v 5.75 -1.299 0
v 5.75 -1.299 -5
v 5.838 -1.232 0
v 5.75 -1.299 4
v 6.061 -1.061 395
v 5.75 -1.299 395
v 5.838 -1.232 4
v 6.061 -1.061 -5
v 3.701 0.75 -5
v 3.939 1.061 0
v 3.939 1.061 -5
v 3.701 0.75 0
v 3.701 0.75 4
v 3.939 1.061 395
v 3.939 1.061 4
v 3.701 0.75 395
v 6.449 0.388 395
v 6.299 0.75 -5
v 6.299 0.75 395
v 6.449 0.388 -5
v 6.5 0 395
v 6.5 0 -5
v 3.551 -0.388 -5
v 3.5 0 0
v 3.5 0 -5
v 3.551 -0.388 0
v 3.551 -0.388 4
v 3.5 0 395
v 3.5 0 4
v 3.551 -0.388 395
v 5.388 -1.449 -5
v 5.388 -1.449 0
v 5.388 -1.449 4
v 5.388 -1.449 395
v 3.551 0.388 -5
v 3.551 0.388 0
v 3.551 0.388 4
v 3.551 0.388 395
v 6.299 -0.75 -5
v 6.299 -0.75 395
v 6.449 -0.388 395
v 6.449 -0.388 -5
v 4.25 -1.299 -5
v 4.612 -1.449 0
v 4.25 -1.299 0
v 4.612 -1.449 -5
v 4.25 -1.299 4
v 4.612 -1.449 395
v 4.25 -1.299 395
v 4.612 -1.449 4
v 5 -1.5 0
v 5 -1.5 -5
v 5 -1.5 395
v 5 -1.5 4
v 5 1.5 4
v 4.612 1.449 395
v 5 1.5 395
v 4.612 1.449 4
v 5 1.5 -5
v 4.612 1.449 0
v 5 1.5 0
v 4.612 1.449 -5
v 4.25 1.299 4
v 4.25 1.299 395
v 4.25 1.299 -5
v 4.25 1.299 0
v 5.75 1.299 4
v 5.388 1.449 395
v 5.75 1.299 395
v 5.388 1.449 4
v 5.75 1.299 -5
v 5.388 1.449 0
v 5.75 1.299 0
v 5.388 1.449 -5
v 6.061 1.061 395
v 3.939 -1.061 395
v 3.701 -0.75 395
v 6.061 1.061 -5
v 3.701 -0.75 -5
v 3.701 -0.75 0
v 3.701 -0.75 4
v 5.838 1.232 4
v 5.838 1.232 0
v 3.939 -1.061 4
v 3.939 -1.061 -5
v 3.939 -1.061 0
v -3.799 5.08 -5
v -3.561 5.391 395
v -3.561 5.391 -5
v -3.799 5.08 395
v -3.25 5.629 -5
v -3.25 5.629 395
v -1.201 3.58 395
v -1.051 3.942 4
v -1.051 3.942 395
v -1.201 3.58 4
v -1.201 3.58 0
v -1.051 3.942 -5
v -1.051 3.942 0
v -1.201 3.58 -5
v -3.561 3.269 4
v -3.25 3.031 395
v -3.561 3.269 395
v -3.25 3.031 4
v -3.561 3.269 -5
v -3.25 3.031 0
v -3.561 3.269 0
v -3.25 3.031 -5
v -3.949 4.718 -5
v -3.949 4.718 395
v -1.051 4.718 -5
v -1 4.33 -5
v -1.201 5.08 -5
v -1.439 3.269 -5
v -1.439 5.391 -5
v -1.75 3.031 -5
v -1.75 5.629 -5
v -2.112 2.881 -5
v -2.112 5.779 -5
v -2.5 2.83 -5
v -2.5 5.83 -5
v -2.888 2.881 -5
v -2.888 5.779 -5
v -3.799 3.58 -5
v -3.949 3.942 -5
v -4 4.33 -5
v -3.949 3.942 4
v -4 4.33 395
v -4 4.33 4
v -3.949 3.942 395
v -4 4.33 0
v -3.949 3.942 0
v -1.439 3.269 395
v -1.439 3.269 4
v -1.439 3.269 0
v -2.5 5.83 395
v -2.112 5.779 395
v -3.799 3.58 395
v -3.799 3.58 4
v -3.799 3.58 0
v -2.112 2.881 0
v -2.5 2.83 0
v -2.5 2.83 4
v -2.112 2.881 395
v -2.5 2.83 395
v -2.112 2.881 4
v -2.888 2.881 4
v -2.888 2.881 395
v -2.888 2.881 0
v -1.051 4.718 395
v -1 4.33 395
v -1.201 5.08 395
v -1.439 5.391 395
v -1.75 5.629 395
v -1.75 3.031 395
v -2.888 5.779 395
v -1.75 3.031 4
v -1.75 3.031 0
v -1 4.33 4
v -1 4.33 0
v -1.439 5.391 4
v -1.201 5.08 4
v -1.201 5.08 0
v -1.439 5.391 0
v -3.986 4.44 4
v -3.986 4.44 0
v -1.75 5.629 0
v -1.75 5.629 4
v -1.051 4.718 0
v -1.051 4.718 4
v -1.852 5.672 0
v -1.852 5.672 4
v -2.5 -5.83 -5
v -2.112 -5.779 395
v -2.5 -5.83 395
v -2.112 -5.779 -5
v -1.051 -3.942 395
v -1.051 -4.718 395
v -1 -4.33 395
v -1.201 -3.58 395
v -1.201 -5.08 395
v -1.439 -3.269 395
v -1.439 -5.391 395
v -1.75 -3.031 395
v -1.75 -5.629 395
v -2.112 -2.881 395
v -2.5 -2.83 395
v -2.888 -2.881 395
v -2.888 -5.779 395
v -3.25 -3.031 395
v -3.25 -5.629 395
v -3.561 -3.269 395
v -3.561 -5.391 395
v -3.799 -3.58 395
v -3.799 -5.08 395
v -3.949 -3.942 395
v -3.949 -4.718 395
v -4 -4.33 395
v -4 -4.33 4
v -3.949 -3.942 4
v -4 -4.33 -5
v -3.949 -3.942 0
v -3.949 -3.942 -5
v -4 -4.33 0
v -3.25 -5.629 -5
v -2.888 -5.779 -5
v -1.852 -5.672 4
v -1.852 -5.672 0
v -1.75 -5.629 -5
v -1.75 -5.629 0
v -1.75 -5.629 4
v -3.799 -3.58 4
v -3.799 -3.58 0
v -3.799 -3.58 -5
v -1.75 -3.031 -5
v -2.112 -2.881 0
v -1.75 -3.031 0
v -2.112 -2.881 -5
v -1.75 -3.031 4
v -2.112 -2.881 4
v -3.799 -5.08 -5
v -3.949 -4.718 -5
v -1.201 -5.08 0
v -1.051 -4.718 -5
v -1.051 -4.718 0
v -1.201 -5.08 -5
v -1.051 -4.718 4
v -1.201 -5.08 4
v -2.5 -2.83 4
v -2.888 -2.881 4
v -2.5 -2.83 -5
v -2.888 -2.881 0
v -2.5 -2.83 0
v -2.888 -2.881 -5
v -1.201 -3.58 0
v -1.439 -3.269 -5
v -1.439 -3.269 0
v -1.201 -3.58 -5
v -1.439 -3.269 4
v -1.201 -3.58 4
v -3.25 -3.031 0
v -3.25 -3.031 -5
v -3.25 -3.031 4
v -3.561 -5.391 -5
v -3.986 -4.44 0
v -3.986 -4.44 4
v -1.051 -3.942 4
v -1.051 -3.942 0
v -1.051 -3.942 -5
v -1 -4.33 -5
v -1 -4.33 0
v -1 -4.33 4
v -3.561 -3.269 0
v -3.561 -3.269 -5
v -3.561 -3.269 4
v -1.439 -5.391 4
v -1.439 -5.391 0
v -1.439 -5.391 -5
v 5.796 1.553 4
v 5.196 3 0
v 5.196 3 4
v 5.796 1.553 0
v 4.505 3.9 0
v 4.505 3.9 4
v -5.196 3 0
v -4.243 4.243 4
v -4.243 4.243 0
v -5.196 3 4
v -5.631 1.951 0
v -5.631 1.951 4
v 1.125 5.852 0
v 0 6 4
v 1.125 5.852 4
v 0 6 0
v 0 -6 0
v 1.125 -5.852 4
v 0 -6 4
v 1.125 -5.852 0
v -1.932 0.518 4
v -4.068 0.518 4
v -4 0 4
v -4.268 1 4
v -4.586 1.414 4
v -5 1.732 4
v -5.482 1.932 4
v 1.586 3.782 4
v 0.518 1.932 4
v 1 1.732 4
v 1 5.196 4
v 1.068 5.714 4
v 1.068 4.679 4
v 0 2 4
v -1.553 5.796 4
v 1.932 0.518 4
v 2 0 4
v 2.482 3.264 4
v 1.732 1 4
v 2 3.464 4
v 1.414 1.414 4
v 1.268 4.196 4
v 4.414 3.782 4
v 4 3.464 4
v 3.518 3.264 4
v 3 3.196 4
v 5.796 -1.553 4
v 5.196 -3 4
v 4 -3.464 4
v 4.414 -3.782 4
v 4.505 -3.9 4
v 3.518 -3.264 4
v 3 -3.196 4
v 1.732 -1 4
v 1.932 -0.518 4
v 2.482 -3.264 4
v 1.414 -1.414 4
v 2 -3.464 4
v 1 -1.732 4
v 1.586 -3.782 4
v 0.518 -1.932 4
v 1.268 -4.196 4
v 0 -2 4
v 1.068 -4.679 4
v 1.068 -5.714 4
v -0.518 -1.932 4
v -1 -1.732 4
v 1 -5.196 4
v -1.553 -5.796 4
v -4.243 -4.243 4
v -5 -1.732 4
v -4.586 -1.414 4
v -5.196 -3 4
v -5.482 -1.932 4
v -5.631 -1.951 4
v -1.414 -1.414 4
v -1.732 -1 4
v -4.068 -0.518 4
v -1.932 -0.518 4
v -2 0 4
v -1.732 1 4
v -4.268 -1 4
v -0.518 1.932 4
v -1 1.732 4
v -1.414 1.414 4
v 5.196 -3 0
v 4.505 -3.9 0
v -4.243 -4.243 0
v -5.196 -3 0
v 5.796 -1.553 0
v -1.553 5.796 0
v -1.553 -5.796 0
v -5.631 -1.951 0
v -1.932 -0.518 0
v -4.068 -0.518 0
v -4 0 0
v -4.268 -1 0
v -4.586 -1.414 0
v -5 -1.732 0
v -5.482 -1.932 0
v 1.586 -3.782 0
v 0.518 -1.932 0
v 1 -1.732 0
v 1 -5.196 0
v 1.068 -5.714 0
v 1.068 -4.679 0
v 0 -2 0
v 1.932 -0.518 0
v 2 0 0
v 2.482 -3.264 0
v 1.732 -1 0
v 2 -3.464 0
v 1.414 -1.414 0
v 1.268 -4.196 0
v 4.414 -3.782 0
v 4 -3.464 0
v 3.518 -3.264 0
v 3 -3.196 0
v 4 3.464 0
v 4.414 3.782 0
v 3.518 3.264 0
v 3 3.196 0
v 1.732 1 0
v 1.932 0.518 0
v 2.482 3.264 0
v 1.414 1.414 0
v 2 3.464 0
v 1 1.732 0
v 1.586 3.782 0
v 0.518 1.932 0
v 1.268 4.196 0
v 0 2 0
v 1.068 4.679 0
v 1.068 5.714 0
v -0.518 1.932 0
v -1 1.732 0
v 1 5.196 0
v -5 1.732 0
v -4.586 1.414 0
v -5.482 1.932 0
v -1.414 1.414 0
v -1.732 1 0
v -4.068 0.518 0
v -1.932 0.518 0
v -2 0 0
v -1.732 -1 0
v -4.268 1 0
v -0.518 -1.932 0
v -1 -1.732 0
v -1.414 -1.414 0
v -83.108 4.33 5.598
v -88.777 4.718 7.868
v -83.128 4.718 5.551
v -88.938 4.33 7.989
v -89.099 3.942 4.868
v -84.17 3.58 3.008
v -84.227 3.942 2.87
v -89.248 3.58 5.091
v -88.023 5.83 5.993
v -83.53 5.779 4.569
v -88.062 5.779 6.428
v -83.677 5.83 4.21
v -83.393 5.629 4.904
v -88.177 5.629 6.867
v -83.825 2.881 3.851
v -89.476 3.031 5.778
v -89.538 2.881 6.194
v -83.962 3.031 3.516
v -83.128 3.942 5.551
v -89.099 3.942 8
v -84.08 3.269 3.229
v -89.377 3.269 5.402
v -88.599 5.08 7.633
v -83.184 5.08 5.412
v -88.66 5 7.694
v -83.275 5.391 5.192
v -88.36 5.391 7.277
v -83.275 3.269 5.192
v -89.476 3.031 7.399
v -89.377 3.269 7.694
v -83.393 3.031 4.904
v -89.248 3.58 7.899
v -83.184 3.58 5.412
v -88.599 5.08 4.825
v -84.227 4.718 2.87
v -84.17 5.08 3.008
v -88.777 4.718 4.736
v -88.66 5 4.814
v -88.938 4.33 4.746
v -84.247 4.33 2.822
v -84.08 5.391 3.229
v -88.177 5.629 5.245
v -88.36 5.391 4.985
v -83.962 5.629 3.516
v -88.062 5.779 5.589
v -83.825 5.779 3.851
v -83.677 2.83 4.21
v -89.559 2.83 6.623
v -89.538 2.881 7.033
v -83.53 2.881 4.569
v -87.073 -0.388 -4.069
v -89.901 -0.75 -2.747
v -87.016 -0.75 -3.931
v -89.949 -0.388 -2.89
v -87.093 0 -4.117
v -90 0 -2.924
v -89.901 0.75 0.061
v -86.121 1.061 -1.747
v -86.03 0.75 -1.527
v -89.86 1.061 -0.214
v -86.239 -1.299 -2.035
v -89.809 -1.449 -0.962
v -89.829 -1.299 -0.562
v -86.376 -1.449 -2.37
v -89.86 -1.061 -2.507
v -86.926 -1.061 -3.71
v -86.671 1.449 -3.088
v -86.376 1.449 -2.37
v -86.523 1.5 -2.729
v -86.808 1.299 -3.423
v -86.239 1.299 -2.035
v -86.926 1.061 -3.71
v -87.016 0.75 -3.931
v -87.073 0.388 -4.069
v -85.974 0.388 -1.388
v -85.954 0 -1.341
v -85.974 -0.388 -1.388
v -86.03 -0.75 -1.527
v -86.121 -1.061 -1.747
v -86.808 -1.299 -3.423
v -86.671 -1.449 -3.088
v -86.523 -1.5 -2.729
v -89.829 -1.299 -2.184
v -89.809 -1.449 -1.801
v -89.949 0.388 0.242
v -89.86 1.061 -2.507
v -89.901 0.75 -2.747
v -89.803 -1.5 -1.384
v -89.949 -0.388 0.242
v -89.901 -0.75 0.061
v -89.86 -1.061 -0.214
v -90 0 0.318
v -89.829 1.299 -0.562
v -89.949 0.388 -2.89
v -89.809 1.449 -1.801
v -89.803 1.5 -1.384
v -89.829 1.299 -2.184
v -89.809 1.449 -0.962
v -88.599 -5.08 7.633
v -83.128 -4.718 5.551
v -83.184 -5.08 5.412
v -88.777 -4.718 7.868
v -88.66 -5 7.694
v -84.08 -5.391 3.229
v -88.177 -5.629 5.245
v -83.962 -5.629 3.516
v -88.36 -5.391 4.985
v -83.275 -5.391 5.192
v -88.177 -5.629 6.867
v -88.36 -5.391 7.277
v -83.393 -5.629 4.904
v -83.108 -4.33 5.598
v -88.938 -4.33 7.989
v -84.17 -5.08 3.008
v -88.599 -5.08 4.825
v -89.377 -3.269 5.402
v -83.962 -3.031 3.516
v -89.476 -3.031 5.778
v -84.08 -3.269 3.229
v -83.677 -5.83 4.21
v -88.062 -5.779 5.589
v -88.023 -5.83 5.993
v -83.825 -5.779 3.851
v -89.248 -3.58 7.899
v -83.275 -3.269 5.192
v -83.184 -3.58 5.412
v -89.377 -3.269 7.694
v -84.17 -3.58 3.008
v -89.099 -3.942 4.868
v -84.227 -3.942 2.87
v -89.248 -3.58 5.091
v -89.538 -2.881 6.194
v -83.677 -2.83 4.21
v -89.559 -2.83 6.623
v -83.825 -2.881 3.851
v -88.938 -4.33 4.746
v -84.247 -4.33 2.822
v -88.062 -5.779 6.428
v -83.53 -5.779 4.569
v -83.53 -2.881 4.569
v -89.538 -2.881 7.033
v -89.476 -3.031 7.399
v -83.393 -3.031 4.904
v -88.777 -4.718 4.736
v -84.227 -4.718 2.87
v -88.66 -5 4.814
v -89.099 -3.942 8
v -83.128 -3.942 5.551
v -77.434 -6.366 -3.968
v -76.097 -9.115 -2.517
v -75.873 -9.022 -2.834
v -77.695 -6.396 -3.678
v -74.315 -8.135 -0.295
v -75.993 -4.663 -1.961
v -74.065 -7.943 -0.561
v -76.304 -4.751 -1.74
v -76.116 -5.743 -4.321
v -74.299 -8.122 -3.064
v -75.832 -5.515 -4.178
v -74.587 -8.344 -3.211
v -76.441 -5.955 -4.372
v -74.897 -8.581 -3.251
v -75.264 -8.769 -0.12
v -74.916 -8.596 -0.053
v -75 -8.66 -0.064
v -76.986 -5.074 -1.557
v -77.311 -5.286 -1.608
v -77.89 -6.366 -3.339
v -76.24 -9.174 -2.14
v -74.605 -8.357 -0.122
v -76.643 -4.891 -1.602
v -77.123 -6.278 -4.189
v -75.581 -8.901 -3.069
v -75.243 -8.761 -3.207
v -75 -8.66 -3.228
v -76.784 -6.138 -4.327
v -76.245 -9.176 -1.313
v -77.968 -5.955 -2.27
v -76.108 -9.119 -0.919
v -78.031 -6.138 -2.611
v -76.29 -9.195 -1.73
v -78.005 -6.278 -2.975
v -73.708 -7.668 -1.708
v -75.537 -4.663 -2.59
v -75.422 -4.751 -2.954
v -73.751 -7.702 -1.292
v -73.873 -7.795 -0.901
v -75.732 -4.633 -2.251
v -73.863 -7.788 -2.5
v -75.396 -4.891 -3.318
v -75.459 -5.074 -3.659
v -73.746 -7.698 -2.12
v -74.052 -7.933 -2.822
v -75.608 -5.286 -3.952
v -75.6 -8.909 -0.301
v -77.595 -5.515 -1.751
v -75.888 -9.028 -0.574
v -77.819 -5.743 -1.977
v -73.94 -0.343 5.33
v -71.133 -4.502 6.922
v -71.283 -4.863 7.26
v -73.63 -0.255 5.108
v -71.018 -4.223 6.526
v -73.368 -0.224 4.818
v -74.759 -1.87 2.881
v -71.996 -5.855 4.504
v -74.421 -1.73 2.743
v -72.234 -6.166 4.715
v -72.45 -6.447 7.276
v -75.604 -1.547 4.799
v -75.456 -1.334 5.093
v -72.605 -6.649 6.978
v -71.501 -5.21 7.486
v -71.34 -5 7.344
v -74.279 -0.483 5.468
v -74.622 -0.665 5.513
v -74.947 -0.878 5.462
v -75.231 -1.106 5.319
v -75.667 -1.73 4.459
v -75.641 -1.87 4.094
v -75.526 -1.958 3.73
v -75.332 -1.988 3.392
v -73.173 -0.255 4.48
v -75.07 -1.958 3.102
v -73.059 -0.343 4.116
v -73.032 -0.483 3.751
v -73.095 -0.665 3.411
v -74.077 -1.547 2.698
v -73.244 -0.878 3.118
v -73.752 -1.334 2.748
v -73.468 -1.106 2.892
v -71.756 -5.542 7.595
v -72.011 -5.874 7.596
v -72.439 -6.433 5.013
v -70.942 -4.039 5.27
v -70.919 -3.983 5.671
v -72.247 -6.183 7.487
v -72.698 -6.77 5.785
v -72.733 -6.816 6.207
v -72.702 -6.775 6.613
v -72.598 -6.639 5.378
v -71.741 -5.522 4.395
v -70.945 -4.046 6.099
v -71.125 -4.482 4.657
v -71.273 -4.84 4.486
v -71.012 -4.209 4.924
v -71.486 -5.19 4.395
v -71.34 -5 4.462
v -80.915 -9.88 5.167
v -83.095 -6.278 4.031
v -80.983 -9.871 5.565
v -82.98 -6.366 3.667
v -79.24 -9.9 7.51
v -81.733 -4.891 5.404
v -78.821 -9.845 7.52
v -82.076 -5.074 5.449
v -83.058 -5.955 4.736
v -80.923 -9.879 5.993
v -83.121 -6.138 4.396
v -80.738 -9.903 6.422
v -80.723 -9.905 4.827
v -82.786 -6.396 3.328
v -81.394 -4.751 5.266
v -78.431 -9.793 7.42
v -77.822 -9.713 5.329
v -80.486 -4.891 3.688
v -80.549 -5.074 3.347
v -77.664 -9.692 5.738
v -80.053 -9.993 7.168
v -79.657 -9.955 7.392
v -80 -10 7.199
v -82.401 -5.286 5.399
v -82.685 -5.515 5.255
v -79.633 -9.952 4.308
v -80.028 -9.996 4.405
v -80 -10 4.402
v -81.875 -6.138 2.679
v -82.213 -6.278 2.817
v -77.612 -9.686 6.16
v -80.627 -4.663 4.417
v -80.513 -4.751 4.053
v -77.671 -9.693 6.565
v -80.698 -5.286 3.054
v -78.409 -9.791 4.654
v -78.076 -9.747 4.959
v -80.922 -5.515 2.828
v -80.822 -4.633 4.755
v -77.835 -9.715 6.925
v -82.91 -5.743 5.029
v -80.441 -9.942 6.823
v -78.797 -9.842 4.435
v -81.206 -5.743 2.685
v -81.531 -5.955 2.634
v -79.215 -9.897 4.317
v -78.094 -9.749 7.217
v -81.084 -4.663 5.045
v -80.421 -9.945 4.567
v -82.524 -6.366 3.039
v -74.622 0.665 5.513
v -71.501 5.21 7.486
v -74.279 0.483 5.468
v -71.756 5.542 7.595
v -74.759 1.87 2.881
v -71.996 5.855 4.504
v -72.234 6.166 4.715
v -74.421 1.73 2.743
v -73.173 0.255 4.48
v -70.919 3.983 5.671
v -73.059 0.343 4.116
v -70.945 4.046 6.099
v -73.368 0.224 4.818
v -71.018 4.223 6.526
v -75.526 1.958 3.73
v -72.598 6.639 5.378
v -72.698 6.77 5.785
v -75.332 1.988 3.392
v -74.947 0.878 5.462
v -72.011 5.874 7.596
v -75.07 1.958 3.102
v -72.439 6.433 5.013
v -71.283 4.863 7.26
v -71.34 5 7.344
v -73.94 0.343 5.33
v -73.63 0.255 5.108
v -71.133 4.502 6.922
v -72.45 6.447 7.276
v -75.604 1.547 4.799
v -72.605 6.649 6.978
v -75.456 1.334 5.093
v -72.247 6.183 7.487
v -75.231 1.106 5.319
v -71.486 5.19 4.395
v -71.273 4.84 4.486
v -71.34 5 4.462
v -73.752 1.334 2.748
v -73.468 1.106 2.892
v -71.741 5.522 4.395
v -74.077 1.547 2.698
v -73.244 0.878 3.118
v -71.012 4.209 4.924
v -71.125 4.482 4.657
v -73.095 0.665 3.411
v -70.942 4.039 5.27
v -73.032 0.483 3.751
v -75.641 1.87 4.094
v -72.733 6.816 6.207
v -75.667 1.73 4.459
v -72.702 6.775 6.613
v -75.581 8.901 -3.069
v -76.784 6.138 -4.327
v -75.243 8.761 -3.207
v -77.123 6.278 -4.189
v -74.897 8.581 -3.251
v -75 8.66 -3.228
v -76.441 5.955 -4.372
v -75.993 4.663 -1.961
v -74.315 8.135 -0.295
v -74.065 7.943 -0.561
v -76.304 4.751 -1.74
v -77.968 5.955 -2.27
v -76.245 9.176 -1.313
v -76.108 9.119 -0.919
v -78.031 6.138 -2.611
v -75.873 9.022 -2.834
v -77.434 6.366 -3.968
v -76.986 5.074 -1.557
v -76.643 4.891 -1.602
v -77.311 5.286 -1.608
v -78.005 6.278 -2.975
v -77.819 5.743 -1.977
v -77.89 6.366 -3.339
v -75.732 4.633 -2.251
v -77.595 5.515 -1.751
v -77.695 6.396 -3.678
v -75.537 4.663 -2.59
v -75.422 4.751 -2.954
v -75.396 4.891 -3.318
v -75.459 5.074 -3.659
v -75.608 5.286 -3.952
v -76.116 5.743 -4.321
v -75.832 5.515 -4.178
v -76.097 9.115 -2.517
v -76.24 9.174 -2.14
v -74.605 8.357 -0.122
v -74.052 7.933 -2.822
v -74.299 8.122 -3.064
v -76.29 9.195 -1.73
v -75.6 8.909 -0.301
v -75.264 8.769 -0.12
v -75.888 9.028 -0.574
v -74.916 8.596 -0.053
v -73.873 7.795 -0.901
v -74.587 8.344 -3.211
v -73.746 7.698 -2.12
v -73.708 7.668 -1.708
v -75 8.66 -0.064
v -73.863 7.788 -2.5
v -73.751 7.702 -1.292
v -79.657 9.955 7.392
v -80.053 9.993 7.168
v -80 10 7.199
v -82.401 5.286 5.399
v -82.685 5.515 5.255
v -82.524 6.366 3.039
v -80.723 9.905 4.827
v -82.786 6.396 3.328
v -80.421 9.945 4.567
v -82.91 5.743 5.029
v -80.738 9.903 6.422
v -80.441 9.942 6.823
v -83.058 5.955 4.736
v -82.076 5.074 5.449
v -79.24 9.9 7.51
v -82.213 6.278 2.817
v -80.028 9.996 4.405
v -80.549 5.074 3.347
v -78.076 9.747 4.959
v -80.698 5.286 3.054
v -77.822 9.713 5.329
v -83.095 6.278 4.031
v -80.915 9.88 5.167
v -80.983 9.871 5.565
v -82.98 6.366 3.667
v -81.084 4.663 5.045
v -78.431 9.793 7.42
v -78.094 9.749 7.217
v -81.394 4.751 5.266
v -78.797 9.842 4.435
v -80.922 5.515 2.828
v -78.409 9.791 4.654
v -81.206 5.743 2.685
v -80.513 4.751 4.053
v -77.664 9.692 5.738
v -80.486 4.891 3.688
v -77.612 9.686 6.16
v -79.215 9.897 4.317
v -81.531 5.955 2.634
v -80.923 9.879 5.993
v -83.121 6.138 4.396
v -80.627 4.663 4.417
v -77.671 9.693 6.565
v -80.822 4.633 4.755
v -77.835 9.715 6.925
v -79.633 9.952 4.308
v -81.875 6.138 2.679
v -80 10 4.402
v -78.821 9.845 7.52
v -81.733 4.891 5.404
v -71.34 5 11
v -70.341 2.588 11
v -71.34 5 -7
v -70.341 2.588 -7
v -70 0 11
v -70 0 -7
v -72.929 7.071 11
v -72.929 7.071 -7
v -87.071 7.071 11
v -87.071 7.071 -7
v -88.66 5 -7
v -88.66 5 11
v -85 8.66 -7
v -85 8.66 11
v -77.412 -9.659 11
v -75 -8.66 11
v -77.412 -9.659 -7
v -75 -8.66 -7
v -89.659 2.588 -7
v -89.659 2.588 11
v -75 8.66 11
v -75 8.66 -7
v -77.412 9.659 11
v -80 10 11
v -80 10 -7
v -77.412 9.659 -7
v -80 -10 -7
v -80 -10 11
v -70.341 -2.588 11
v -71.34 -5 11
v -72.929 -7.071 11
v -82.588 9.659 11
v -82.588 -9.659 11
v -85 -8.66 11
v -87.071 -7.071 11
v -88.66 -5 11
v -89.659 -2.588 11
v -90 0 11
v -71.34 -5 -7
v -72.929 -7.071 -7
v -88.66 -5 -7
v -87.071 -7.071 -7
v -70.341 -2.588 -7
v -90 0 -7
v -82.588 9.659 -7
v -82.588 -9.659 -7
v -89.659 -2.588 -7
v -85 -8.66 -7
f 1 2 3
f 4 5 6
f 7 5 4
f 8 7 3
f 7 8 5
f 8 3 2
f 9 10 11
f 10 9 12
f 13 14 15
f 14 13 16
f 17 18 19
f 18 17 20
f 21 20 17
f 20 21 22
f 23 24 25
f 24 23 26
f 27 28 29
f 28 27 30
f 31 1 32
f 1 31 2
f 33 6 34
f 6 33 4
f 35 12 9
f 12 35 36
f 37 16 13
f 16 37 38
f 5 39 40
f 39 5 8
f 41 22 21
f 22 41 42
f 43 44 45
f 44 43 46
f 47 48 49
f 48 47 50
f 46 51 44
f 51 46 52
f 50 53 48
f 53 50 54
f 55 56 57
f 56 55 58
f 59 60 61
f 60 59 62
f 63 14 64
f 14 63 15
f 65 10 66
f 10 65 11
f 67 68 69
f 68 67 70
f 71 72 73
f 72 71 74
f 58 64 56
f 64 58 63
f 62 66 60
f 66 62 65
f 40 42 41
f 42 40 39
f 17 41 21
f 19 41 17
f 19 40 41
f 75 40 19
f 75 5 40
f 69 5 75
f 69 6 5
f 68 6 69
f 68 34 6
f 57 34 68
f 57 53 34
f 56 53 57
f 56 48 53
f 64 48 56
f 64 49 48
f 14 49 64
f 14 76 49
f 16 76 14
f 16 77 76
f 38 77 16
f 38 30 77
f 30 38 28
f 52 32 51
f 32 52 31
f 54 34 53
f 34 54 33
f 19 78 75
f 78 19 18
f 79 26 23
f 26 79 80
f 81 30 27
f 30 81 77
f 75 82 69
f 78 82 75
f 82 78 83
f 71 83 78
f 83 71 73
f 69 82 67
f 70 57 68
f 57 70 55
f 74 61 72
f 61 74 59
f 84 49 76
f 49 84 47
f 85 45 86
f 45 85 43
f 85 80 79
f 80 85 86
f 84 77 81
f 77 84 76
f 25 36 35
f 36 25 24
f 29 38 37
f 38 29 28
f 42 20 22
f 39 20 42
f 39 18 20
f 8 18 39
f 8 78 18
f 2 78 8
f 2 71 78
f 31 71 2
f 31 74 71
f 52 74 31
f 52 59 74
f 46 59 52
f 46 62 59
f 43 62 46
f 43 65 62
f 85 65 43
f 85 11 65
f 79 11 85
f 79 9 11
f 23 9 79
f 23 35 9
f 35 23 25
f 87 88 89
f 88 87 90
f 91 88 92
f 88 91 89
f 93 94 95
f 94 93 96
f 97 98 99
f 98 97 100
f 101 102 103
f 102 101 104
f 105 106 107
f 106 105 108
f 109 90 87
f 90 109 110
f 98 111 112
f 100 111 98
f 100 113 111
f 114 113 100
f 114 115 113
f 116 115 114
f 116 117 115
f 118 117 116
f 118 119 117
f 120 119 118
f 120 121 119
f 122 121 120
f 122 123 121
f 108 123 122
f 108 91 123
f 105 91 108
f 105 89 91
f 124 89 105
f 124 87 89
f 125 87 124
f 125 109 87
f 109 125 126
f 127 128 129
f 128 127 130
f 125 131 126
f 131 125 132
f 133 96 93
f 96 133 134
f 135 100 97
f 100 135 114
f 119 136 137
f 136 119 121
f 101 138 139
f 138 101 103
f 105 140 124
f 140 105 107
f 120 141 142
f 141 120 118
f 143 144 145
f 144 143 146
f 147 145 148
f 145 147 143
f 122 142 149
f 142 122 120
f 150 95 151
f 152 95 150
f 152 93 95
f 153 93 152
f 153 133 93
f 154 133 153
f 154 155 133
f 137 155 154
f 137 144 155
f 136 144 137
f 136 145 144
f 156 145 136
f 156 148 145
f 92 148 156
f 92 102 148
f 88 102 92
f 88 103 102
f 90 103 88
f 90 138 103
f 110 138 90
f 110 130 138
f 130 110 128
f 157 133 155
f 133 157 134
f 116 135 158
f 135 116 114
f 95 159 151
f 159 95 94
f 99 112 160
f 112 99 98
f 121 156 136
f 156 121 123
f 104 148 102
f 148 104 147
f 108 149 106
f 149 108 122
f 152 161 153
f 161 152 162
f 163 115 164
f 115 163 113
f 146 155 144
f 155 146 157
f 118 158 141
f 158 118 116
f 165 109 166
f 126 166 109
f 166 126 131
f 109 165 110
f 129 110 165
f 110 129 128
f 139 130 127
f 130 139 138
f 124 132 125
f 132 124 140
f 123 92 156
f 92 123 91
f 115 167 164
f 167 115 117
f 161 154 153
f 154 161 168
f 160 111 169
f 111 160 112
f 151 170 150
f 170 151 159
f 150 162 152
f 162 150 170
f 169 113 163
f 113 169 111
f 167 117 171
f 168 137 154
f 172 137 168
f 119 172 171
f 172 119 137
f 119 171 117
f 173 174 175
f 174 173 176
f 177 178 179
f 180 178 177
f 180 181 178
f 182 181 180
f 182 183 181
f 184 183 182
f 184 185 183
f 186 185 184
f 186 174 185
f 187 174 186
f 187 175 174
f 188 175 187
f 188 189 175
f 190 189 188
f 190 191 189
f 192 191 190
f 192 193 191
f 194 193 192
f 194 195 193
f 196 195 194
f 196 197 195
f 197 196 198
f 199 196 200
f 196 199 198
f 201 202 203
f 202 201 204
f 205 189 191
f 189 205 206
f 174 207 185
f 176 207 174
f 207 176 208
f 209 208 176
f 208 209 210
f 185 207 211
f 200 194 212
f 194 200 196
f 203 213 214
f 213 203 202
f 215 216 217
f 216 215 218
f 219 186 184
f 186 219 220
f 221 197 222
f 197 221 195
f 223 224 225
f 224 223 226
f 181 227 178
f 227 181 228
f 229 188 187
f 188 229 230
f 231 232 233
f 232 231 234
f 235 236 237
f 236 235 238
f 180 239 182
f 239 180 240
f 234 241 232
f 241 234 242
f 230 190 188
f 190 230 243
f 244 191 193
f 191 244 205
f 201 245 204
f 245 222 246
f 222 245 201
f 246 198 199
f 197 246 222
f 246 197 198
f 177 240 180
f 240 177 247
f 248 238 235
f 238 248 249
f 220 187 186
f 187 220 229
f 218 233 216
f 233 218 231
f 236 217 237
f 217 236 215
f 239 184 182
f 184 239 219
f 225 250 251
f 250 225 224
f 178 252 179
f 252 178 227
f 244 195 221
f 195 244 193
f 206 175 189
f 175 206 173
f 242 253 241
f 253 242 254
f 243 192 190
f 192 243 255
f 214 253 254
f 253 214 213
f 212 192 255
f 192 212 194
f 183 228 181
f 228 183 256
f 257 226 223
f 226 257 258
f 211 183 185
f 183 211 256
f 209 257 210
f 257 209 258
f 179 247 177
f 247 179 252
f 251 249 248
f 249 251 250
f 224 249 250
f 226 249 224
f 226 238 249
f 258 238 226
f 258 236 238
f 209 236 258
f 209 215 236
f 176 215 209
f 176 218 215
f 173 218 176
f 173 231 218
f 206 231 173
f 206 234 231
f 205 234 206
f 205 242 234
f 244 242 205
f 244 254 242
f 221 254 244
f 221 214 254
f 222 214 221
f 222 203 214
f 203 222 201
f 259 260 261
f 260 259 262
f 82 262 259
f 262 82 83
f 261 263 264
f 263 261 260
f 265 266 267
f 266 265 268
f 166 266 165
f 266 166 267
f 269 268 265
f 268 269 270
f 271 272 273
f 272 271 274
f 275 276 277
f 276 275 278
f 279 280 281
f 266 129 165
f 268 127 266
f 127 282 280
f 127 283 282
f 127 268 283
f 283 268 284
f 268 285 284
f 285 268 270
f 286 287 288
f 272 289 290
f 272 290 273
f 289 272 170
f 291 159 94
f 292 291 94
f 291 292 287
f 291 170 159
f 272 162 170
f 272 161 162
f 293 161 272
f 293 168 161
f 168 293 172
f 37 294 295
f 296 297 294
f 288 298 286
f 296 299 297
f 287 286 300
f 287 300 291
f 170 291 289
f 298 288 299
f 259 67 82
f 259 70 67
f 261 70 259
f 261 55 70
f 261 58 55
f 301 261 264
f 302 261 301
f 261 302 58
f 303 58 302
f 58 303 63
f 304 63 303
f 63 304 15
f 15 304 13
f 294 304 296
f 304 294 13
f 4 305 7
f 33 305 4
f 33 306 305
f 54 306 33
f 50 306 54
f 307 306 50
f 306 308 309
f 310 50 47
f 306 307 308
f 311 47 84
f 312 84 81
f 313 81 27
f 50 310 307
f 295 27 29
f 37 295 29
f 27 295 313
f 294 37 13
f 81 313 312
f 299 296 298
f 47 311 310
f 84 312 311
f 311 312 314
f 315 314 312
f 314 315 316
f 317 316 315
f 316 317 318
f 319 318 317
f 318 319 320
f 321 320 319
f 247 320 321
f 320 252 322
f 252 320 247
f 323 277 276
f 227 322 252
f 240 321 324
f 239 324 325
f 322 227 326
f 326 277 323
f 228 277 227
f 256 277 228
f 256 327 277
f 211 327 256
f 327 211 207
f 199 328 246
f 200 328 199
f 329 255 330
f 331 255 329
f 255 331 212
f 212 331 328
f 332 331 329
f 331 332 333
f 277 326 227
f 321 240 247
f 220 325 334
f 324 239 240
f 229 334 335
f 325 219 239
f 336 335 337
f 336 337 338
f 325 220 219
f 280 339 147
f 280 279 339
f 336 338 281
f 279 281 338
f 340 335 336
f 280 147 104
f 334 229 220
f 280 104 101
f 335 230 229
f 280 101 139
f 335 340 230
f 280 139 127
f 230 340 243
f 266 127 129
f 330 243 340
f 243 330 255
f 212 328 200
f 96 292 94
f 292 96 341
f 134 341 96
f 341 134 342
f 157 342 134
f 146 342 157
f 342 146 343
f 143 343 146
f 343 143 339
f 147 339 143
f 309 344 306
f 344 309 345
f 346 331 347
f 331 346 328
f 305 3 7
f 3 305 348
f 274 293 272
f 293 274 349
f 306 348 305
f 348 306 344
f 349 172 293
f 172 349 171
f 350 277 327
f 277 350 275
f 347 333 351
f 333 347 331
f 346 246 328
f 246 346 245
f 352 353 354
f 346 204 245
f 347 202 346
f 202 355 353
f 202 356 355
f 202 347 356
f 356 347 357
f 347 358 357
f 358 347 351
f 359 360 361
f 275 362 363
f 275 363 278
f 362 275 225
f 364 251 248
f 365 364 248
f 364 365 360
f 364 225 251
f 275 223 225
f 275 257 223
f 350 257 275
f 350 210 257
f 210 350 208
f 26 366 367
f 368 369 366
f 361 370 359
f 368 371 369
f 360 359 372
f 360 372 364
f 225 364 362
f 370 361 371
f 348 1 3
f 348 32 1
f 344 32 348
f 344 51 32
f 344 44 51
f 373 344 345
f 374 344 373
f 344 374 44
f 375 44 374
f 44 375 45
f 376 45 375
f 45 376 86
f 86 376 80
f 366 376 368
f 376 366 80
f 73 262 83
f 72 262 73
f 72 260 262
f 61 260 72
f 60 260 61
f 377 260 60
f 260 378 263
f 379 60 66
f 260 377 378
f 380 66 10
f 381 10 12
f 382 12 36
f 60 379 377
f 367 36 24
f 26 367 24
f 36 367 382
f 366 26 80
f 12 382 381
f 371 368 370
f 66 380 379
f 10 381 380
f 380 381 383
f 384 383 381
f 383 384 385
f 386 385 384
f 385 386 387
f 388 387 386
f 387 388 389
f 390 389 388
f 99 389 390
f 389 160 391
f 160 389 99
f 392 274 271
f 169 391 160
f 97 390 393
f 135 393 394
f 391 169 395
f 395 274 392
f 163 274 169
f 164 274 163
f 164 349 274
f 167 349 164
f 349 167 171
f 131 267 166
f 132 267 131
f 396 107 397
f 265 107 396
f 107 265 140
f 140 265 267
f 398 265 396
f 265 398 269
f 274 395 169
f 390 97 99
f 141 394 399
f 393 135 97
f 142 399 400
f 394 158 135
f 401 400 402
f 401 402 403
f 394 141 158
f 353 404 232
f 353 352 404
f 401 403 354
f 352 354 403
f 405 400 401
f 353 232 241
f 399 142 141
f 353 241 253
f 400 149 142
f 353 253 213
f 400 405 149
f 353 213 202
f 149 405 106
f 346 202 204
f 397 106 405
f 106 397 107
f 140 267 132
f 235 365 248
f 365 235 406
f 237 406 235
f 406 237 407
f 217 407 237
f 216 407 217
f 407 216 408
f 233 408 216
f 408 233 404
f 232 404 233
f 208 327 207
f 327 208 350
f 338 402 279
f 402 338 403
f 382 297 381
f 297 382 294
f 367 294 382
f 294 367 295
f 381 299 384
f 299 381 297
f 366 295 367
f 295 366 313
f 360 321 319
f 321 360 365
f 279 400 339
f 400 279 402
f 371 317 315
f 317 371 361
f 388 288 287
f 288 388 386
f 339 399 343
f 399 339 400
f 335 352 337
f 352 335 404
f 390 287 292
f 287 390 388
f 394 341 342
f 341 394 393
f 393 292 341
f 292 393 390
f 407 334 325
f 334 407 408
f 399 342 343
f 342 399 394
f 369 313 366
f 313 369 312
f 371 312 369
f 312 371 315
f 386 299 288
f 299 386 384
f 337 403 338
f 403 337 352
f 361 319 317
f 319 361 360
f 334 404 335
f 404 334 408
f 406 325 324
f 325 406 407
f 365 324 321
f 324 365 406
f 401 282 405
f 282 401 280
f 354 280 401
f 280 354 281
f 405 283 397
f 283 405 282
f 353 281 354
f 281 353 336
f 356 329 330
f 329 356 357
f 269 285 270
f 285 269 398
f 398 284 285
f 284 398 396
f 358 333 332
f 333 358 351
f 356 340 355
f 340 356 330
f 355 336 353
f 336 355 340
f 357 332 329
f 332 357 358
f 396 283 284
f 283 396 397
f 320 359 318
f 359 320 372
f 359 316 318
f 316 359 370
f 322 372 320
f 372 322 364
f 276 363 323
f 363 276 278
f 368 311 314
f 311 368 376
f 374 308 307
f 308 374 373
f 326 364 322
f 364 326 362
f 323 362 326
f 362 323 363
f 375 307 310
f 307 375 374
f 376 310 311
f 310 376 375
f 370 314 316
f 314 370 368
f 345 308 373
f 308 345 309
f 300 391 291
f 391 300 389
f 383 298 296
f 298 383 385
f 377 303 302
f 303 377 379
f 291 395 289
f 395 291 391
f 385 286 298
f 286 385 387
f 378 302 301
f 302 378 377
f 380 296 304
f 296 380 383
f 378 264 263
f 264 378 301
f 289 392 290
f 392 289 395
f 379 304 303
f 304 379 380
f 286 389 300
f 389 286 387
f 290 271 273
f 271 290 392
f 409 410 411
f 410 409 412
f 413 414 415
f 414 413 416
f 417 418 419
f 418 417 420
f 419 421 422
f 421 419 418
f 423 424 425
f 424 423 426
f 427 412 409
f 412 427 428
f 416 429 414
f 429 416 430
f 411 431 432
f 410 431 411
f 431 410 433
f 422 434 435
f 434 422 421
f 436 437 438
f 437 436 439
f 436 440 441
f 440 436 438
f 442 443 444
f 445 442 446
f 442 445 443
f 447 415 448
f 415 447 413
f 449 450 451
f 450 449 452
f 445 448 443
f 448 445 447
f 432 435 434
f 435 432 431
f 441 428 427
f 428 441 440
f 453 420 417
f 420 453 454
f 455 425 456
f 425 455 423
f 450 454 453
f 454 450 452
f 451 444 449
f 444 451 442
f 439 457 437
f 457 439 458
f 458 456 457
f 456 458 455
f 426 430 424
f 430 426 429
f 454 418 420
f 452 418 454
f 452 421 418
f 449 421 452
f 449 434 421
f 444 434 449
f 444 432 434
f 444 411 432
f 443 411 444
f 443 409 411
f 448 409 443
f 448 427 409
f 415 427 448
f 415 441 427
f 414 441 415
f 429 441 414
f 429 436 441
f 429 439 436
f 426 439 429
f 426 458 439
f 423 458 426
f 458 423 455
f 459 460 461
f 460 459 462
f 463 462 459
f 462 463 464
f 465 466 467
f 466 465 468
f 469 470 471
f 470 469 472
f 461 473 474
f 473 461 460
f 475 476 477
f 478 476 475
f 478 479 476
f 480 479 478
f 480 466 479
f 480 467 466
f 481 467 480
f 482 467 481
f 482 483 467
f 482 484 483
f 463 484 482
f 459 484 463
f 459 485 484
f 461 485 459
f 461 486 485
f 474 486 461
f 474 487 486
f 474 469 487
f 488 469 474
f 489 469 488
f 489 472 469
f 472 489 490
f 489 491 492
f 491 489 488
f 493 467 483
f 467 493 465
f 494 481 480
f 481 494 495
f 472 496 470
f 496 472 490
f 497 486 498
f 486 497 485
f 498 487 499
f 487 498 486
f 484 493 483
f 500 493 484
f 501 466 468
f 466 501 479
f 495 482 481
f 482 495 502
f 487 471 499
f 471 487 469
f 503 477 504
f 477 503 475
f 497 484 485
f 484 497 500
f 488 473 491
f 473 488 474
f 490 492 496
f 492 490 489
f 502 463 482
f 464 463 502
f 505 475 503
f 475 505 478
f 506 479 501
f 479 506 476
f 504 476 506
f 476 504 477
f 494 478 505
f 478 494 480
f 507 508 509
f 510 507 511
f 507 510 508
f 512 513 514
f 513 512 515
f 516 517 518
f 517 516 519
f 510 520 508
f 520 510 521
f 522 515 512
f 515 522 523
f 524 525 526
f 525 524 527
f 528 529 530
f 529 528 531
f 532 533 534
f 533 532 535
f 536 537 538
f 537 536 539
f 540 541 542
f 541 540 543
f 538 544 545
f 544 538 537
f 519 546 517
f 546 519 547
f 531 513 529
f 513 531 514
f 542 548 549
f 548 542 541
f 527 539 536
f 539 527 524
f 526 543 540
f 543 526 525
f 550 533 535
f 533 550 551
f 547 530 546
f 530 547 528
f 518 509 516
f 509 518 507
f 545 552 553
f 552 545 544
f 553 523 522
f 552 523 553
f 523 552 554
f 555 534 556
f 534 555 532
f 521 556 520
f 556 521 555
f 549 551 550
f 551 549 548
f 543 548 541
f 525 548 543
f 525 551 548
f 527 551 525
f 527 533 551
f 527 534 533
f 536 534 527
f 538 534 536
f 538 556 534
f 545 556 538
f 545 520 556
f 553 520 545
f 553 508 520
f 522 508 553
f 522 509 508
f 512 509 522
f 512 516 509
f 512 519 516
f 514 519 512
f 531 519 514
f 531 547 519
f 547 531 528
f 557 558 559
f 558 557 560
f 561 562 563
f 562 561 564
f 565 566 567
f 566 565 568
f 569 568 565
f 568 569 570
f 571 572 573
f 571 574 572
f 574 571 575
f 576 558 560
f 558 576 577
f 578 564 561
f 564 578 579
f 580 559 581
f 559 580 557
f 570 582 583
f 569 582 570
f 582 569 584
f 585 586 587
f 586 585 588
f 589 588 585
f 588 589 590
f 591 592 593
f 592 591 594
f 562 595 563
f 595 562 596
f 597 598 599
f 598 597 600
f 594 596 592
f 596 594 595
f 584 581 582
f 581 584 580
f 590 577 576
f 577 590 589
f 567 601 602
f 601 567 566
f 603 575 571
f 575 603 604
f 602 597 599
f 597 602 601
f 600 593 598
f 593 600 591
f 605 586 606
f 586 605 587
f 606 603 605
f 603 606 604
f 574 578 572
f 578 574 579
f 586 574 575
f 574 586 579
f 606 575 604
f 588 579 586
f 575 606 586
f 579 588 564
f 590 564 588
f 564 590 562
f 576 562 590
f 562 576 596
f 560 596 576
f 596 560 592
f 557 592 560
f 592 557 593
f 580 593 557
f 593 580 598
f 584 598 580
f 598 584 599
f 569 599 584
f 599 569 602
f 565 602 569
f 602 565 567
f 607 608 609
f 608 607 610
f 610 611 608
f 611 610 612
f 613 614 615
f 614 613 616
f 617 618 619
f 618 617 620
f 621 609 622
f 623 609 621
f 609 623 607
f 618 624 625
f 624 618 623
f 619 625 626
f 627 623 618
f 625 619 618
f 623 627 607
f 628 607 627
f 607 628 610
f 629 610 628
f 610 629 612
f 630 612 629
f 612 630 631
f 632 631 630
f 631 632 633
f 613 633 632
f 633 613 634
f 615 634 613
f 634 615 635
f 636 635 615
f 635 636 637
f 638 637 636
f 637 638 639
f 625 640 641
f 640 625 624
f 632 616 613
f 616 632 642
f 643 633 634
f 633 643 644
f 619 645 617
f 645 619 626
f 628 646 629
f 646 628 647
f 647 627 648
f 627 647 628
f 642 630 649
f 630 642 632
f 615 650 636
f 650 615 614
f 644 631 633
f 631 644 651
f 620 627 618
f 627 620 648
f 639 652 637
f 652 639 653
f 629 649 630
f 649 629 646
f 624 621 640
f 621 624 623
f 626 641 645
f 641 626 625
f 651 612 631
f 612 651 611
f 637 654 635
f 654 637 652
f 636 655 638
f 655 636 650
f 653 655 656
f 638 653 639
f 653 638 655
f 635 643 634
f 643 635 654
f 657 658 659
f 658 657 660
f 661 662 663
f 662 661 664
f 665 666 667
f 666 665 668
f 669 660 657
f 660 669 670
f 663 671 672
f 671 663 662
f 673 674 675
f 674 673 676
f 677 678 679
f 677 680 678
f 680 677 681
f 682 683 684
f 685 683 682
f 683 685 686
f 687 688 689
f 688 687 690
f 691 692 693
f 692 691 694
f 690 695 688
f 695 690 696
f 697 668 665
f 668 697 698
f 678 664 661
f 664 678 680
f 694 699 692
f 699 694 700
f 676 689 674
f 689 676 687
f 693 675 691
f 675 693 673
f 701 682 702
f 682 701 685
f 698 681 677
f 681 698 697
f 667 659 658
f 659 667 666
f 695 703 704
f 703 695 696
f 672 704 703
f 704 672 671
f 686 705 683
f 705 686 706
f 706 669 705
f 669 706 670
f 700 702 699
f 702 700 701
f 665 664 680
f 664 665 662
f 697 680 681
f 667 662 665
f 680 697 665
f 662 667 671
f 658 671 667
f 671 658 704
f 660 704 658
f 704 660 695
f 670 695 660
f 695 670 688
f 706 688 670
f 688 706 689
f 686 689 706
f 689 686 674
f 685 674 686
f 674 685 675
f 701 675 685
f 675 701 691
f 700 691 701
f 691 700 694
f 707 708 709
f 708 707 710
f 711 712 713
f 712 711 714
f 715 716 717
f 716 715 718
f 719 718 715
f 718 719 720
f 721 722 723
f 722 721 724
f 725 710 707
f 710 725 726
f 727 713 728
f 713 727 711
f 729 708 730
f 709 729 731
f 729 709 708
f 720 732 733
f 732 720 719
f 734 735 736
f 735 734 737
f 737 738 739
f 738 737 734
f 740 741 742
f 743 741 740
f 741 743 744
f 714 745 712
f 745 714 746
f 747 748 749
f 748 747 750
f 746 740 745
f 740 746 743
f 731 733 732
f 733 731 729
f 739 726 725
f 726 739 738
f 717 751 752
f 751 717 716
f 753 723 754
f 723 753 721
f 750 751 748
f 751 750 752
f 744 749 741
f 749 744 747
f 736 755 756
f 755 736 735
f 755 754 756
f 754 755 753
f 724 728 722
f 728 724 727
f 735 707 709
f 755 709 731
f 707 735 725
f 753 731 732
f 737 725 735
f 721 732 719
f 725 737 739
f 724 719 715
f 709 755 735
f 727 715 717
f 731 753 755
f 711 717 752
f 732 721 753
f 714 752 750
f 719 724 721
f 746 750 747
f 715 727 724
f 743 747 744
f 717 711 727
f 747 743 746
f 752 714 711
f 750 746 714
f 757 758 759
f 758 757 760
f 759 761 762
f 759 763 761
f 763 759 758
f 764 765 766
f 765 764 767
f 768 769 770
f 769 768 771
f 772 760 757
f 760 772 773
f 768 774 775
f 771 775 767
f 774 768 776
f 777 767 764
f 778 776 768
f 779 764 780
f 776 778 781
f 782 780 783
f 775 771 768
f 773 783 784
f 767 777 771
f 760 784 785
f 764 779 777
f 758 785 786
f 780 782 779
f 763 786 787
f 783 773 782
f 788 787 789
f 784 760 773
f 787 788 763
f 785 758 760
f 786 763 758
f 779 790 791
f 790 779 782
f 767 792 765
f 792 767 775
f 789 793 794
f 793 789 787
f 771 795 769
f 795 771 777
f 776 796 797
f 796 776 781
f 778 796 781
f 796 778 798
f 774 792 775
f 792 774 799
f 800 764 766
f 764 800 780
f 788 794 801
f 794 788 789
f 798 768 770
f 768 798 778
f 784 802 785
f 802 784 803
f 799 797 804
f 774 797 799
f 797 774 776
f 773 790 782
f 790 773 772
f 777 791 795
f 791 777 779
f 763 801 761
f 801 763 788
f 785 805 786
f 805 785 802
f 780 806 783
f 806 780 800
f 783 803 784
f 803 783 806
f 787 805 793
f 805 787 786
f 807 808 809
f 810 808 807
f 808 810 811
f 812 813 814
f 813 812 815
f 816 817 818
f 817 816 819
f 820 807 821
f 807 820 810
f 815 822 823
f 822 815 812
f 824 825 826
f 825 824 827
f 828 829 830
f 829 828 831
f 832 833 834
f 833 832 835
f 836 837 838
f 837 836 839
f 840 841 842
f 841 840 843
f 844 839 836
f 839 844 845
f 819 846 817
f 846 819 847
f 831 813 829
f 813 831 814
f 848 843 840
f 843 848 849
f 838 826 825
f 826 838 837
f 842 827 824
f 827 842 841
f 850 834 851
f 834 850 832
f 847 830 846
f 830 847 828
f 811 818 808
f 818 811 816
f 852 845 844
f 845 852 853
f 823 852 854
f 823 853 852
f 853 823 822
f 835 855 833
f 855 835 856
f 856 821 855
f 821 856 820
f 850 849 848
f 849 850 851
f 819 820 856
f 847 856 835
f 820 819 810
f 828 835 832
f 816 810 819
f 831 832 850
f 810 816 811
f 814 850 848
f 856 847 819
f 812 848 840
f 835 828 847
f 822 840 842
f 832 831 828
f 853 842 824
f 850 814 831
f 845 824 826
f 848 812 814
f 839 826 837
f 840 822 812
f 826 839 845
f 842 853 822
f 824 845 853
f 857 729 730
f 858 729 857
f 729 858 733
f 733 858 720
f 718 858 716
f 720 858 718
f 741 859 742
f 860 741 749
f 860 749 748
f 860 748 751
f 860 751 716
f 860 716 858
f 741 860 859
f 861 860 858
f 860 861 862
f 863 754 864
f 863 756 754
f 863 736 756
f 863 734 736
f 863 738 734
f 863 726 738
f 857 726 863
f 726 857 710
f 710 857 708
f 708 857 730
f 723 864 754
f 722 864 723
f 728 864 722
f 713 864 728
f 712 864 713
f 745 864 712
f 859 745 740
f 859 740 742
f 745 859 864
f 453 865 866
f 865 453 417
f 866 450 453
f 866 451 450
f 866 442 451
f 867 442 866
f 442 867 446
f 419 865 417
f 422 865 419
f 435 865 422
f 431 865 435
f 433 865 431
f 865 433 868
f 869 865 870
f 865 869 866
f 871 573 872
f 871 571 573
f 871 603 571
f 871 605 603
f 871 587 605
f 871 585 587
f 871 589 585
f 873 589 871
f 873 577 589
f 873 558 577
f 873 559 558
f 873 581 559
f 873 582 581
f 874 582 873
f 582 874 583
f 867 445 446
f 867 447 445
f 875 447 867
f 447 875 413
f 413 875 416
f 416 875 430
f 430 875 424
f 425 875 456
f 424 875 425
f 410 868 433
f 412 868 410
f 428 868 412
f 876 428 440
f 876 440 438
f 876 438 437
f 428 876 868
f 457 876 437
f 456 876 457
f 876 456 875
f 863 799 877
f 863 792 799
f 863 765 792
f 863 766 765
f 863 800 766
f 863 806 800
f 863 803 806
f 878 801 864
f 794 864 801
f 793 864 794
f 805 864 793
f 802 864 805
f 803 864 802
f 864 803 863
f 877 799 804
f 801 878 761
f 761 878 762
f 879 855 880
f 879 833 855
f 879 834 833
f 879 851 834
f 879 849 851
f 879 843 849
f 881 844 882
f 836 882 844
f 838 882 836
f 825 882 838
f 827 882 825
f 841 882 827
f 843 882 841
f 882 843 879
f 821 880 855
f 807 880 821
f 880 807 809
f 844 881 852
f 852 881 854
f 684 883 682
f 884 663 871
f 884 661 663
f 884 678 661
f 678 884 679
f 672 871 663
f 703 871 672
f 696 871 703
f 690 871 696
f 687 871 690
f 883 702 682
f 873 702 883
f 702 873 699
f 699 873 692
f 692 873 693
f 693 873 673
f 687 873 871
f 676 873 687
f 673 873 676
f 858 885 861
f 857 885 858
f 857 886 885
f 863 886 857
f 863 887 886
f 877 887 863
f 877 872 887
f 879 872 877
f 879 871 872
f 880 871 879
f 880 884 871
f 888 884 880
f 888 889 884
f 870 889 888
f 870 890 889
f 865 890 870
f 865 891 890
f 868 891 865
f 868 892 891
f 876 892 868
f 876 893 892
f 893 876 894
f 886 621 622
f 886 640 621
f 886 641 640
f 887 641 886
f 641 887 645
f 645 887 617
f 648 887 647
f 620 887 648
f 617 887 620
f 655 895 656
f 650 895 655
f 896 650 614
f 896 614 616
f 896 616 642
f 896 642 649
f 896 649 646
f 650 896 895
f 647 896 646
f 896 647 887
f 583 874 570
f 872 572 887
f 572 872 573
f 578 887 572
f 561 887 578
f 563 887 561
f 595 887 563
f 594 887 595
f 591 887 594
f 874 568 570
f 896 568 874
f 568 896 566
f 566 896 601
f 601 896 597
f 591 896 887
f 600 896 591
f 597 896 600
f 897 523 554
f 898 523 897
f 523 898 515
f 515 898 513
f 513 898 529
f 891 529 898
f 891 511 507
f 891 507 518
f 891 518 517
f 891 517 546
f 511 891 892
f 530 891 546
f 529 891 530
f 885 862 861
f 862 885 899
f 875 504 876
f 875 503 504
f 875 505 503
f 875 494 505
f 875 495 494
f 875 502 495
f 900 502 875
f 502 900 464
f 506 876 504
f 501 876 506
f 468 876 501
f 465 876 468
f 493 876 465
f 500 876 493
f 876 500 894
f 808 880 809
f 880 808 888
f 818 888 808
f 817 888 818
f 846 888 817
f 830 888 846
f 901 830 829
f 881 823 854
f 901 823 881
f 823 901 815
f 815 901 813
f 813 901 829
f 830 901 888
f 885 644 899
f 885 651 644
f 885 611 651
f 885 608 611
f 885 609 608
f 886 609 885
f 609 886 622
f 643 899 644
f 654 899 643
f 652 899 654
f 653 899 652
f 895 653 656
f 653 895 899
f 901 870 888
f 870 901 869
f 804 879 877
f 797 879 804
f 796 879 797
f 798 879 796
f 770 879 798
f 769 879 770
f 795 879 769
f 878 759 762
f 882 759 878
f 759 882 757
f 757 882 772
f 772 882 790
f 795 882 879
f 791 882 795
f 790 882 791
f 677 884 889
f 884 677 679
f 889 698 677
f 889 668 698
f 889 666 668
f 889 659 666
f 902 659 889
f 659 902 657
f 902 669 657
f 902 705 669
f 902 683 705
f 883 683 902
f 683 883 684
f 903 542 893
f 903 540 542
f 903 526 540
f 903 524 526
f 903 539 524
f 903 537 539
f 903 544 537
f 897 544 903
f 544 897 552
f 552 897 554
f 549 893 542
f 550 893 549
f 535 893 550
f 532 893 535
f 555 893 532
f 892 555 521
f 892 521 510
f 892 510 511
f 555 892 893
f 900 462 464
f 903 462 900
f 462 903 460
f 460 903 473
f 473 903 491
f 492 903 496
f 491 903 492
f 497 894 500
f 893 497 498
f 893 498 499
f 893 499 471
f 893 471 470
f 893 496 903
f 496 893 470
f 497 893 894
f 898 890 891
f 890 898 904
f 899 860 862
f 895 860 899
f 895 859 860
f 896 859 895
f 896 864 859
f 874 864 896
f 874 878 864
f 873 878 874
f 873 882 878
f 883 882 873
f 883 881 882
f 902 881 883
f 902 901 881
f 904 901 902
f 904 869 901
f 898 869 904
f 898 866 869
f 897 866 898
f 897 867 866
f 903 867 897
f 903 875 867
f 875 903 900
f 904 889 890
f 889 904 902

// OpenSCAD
$fn = 24;


//rotate([60,0,0])
//rotate([0,90,0])  stick3();



difference() {
  difference() {
    union() {
      color("green") cylinder(r=6,h=4);
      translate([0,0,-10]) rotate([0,-90,0]) stick3();
    }
    //middle hole
    color("red") translate([0,0,-1]) cylinder(d=4,h=10);
  }
  //outer holes
  color("red") union(){
    for(i=[0:2]) {
      rotate([0,0,120*i]) 
      translate([-6,0,-1]) cylinder(d=4,h=10);
    }
  }  
}



//corner fitting
translate([-80,0,0]) 
difference() {
  color("red") translate([0,0,-7]) cylinder(r=10,h=18);
    
  union() rotate([0,-36,0]) {
    rotate([60,-(180-58.3),0]) stick3();
    rotate([0,0,-54]) {
      rotate([-30,0,0]) stick3();
      rotate([-90,0,108]) stick3();
    }
  }
}

module stick3() {
  translate([5,0,0])
  rotate([0,90,0])
  for(i=[0:2]) {
    rotate([0,0,120*i]) translate([5,0,0]) cylinder(h=400, d=3);
  }
}
